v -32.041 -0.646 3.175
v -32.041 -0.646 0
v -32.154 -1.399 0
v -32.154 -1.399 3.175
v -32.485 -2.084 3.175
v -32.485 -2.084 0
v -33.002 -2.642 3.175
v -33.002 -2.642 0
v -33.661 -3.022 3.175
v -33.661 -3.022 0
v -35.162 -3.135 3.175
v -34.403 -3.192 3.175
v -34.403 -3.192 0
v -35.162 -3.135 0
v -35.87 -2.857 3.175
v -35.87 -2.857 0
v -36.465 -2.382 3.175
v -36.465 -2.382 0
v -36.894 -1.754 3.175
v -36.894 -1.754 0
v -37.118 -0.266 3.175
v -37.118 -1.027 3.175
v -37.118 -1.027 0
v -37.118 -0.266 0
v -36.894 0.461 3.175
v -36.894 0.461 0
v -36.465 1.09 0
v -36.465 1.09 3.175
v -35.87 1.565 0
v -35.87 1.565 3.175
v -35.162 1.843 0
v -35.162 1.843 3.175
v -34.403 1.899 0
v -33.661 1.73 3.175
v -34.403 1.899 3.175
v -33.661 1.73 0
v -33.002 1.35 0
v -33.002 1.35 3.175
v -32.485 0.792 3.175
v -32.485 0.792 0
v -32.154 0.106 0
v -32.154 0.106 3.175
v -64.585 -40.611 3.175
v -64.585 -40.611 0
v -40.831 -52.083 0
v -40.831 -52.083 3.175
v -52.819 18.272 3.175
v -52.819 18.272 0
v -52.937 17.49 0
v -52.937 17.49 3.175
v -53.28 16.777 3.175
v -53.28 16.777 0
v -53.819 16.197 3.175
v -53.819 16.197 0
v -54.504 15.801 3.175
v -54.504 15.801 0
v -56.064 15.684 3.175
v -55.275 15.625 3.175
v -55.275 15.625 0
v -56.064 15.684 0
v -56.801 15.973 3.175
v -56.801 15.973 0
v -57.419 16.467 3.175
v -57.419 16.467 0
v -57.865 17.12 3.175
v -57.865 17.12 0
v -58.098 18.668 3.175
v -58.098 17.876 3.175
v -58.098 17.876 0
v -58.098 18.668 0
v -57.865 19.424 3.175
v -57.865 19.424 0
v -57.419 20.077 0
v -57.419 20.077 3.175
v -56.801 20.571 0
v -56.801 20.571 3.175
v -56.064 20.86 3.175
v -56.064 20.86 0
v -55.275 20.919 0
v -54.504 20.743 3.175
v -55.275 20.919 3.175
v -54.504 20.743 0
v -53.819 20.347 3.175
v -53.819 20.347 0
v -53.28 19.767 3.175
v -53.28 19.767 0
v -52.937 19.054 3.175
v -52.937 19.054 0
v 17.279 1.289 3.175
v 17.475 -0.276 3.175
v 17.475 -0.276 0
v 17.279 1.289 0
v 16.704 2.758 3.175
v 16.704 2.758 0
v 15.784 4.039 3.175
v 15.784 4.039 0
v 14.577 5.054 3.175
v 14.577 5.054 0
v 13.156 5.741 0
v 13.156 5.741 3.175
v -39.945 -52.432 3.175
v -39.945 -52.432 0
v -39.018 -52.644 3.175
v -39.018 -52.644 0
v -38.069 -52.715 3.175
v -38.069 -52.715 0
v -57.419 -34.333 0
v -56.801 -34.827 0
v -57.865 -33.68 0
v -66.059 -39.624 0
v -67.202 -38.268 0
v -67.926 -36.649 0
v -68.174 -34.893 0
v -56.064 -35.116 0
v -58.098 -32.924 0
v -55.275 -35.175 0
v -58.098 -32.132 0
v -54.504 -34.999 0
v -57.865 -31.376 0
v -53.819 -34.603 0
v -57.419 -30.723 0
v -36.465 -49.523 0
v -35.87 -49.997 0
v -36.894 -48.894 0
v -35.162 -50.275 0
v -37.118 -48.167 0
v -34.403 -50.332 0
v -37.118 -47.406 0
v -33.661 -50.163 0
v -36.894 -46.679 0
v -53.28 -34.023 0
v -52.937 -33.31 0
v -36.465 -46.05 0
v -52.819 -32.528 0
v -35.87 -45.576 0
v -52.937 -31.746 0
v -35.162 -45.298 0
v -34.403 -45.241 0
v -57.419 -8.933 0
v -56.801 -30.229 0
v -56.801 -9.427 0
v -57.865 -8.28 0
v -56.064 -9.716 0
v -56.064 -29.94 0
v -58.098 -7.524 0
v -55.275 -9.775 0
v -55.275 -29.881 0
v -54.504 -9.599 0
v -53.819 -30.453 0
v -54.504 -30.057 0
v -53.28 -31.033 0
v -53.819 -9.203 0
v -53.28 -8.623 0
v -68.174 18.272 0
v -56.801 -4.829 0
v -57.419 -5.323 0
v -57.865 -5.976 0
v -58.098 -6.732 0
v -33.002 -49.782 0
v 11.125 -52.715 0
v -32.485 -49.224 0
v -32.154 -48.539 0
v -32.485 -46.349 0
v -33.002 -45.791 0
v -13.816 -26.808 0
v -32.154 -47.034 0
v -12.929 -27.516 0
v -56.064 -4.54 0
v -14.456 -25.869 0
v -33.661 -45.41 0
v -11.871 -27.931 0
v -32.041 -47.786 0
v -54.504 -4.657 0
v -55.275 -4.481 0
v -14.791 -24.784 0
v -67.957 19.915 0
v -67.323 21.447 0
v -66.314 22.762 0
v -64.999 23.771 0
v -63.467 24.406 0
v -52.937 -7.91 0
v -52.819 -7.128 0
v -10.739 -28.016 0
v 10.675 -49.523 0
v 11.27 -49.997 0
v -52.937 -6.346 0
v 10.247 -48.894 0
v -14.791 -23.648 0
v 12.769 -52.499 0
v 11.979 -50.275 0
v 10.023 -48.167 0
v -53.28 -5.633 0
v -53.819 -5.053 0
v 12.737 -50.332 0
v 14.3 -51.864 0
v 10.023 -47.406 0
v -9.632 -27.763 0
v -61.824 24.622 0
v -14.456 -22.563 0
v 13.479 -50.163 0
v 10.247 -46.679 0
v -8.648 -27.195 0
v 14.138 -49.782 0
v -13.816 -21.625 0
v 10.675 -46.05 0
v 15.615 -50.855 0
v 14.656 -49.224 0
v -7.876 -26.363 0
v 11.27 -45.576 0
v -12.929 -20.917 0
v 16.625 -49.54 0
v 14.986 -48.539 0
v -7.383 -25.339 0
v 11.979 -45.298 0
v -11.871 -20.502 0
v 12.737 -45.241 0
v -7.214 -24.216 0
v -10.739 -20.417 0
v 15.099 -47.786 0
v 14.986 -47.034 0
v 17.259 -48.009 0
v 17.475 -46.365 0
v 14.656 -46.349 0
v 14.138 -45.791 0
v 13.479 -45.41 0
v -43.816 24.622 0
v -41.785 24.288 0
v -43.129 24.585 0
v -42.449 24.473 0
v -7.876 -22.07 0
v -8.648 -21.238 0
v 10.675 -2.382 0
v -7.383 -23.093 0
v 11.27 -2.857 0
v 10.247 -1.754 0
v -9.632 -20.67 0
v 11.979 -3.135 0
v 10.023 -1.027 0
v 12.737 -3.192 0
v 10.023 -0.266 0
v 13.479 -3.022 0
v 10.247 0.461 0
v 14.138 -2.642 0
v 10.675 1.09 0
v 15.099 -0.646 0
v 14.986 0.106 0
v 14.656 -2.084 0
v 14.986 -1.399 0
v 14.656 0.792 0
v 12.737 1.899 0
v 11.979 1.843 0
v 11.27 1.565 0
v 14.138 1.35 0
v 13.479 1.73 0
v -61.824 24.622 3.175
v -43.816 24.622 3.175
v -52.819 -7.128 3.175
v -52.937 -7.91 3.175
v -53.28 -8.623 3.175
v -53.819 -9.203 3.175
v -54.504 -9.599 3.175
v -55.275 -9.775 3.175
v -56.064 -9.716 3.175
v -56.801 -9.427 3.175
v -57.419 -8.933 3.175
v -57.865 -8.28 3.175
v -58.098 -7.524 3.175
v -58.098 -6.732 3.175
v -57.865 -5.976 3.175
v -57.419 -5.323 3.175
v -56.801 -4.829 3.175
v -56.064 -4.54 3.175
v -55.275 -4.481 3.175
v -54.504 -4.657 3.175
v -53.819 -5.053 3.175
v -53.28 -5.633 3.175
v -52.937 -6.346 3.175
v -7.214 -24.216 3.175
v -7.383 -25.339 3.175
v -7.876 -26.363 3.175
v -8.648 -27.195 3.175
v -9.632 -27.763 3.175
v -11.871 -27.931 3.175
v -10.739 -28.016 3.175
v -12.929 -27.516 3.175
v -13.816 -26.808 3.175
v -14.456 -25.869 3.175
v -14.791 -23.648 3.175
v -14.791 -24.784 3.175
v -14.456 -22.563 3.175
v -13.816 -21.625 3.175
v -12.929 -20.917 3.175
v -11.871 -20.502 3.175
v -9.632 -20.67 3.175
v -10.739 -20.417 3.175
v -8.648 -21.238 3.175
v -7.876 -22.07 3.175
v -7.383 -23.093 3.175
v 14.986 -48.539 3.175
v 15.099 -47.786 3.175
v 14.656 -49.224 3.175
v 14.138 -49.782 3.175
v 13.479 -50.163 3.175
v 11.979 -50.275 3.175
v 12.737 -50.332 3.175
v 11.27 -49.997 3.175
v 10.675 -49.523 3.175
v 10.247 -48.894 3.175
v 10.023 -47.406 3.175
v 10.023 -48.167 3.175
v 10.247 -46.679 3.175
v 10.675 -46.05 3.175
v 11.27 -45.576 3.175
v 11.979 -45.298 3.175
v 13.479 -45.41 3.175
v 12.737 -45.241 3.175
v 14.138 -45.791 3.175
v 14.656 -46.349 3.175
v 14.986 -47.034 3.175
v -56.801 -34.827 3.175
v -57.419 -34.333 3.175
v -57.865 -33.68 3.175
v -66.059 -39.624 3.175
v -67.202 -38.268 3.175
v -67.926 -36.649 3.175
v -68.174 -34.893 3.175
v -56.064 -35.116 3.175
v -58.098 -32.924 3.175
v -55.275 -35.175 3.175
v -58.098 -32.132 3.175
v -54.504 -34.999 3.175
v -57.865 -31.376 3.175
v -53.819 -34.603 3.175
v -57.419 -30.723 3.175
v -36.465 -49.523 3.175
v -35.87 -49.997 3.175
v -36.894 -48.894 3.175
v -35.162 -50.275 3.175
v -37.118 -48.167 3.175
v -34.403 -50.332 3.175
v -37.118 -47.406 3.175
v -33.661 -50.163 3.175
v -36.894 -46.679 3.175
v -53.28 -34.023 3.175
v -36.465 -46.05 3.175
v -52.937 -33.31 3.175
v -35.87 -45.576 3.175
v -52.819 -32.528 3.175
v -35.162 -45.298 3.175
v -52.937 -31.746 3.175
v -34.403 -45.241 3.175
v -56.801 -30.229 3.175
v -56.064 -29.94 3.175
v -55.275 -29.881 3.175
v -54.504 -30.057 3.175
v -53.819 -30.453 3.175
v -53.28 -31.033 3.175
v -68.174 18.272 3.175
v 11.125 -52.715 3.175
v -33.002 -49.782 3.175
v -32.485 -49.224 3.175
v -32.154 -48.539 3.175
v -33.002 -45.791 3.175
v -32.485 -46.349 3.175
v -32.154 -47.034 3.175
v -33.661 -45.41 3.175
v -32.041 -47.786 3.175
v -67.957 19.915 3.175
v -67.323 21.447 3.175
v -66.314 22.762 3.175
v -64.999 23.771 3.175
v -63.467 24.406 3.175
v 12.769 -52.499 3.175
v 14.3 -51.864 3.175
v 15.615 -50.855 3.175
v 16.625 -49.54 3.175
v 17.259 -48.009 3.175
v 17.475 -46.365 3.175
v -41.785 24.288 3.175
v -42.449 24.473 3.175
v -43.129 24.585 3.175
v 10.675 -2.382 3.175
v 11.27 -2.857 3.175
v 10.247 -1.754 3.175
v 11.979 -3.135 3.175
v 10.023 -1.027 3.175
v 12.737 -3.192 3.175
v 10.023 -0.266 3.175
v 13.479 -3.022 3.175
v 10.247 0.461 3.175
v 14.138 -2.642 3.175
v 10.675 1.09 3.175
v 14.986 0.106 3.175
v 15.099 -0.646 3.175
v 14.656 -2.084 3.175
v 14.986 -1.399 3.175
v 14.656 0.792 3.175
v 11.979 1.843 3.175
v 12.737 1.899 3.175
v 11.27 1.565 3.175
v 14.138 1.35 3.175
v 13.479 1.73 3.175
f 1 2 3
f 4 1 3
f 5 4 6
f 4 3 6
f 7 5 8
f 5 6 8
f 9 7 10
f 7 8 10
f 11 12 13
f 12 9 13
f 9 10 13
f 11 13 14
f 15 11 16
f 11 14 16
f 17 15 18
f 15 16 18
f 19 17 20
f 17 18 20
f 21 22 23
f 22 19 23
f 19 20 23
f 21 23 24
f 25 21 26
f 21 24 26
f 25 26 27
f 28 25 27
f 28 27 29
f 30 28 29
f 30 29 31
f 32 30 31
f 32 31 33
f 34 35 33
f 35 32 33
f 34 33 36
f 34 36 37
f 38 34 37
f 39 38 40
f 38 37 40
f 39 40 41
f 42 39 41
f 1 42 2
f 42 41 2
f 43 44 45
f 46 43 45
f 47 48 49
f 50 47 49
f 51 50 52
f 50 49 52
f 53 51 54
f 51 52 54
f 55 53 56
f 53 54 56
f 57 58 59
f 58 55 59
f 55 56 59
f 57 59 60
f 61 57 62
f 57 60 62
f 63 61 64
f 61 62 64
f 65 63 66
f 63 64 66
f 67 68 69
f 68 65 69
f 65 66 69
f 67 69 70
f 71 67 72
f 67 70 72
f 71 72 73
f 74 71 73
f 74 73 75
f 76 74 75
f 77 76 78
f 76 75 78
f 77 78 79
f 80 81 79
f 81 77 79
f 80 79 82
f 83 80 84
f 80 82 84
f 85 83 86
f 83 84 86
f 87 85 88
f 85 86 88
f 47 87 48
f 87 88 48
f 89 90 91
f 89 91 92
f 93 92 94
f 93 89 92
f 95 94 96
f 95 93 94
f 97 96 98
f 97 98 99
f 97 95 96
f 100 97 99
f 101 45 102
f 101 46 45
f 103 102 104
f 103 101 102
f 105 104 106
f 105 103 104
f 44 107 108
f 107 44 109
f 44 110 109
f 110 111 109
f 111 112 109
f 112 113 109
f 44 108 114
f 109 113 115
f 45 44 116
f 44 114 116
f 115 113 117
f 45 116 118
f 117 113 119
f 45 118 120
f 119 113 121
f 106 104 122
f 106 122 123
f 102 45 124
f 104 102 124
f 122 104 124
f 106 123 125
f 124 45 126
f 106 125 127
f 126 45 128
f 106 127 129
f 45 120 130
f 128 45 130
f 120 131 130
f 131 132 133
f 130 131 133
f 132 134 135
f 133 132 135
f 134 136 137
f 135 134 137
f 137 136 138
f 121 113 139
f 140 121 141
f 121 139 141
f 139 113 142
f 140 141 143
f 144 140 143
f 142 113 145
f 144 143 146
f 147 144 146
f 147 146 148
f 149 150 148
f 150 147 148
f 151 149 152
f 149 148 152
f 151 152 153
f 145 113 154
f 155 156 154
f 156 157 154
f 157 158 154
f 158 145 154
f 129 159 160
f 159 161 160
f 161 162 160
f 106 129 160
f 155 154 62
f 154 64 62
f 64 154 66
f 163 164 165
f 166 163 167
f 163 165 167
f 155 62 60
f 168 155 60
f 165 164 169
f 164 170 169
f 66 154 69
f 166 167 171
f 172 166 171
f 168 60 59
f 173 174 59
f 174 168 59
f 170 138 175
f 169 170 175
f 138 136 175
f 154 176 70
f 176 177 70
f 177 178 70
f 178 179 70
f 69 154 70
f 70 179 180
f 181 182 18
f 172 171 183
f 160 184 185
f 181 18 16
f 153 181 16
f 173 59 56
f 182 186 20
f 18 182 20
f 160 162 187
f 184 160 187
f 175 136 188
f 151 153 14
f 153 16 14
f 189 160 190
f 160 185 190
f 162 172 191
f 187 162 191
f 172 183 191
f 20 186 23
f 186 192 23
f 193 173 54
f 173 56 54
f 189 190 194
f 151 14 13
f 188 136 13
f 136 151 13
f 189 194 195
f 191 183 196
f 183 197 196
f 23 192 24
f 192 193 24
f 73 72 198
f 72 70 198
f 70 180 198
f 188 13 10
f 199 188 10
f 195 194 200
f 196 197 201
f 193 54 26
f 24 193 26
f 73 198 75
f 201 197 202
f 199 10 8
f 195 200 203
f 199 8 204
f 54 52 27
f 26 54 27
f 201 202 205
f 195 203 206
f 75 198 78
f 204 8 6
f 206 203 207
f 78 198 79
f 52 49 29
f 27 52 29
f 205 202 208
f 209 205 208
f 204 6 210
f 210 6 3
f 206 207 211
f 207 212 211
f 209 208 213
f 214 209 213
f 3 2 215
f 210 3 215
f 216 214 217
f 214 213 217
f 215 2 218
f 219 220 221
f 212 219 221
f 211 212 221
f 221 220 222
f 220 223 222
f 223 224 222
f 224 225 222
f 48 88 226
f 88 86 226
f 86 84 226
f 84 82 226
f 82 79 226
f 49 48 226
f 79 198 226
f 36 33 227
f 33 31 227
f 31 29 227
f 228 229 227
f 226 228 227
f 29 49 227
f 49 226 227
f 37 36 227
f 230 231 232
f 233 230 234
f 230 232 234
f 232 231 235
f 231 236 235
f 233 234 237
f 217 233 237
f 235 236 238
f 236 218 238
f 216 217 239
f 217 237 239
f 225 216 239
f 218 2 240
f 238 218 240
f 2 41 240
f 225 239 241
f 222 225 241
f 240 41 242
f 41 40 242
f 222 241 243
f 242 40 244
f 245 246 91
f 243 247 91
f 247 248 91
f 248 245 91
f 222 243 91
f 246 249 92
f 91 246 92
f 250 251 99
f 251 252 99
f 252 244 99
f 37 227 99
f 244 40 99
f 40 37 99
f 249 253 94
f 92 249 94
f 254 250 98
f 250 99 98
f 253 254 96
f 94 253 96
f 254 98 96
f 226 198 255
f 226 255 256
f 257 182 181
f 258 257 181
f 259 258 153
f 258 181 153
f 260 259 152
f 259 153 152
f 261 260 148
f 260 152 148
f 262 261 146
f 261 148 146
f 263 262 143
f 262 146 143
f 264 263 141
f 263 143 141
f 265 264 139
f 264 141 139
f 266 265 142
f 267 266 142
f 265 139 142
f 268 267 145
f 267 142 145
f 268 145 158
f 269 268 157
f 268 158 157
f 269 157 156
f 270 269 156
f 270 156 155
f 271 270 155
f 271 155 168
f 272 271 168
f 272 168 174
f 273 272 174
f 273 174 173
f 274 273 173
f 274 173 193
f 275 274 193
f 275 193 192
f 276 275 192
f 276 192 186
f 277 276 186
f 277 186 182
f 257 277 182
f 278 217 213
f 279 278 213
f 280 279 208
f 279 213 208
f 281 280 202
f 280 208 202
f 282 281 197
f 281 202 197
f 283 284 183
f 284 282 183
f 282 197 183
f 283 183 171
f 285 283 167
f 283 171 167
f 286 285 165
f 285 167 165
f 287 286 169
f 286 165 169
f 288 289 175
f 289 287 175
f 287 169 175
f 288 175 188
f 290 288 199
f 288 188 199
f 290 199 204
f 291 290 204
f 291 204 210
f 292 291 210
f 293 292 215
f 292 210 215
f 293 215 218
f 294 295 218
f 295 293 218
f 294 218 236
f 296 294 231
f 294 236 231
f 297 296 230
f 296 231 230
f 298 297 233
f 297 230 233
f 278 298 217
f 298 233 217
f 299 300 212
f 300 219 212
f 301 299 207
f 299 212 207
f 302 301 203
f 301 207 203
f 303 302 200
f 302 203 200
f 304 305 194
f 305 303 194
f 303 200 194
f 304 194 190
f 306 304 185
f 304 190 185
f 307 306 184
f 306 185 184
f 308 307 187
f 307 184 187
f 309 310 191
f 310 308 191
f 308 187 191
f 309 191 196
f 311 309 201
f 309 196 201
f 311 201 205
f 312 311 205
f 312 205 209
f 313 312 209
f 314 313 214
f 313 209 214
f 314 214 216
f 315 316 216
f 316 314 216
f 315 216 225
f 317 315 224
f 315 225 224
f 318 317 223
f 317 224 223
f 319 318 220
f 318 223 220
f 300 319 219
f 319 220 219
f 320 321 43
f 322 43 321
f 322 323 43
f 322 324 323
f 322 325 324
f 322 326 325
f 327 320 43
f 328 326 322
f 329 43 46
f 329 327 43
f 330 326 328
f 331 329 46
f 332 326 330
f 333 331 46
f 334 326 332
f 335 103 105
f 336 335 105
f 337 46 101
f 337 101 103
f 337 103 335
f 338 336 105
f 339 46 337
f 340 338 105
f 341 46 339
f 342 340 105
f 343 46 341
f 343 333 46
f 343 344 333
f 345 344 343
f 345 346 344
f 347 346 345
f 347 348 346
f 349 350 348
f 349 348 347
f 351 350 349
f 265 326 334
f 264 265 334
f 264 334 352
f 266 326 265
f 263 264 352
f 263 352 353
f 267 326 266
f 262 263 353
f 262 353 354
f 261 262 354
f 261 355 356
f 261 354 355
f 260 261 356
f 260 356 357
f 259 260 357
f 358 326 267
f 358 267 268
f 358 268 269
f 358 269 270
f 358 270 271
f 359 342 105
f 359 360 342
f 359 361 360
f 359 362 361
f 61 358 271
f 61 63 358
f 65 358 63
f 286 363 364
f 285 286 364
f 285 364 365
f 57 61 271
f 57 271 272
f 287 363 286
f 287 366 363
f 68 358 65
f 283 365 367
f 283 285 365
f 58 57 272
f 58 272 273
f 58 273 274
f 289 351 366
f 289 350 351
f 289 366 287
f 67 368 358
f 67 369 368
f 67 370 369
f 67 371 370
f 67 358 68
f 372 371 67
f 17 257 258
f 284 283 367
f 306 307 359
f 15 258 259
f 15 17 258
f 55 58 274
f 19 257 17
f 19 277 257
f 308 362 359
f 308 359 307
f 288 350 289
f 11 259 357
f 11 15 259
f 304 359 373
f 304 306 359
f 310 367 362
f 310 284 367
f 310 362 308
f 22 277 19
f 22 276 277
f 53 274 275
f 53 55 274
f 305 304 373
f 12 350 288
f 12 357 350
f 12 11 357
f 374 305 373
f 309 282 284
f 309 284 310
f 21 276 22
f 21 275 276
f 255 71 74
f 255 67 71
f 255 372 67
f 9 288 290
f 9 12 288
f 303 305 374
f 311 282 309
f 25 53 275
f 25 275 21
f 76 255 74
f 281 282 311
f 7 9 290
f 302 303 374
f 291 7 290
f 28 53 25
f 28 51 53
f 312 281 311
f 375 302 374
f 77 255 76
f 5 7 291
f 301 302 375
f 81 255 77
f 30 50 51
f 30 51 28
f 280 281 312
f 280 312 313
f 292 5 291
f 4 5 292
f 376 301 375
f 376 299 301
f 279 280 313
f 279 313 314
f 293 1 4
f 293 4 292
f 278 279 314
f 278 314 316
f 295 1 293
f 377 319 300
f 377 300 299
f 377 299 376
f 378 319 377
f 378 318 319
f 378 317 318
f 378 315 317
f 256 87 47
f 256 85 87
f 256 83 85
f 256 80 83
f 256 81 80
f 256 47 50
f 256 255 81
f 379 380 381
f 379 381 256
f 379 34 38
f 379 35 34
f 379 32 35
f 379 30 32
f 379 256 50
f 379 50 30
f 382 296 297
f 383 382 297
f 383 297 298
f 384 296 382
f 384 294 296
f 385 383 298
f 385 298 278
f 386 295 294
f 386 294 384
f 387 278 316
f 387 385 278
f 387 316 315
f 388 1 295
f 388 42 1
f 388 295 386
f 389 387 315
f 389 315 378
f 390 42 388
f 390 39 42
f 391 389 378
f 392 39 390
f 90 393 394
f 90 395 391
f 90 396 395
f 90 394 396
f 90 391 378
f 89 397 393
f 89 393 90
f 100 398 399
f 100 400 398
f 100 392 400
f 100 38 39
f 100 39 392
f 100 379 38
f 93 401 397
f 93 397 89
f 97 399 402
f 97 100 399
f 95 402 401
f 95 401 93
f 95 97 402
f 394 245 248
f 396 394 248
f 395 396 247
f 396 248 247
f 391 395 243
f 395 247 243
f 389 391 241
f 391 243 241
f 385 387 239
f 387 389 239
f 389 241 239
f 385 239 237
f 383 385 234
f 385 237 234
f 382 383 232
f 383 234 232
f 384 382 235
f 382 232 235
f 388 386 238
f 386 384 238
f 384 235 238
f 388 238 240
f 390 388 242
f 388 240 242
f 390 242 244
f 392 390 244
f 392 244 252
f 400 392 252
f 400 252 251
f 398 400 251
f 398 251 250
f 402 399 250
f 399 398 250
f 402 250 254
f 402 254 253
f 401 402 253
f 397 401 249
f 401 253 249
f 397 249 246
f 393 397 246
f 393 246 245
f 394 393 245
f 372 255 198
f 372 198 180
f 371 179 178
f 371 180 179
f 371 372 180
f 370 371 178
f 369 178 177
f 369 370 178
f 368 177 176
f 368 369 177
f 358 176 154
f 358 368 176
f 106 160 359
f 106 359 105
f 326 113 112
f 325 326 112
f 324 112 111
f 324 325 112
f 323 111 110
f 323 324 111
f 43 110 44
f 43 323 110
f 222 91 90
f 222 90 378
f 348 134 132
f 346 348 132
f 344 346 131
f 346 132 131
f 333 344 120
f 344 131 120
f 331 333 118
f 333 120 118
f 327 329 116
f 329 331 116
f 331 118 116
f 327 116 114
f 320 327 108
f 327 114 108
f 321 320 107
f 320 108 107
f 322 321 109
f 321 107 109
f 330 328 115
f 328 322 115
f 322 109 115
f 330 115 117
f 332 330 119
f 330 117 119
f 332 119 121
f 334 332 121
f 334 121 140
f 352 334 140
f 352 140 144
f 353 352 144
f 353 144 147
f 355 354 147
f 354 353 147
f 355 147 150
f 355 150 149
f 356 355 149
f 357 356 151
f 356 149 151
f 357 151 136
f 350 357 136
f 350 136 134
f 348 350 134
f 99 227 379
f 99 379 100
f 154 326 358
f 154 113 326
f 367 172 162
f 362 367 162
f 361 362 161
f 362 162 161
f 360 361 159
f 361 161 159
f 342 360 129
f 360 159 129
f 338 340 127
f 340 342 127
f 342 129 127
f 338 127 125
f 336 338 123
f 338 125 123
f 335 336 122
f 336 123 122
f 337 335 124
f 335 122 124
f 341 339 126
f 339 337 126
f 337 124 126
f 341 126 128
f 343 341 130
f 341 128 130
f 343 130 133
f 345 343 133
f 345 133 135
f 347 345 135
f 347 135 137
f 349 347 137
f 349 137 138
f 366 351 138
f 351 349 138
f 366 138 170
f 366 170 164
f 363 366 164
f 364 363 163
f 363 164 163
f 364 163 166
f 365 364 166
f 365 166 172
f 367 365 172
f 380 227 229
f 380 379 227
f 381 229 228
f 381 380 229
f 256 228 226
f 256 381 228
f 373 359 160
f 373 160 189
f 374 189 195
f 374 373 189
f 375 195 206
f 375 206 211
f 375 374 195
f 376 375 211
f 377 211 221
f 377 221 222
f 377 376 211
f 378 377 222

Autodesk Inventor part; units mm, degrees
ref_plane "YZ Plane" through (0, 0, 0) normal (1, 0, 0) x (0, 1, 0)
ref_plane "XZ Plane" through (0, 0, 0) normal (0, 1, 0) x (-1, 0, 0)
ref_plane "XY Plane" through (0, 0, 0) normal (0, 0, 1) x (1, 0, 0)
sketch "Sketch1" plane through (0, 0, 0) normal (0, 0, 1) x (1, 0, 0)
  line L0 (-39.5223, 4.2825) -> (17.4753, 4.2825)
  line L1 (17.4753, 4.2825) -> (17.4753, -52.7151)
  line L2 (17.4753, -52.7151) -> (-39.5223, -52.7151)
  line L3 (-39.5223, -52.7151) -> (-39.5223, 4.2825)
  circle A0 centre (-34.5937, -47.7865) radius 2.5527
  circle A1 centre (12.5467, -47.7865) radius 2.5527
  circle A2 centre (-34.5937, -0.6461) radius 2.5527
  circle A3 centre (12.5467, -0.6461) radius 2.5527
  line L4 (-68.1735, 24.6219) -> (-42.7735, 24.6219)
  line L5 (-42.7735, 24.6219) -> (-42.7735, -38.8781)
  line L6 (-42.7735, -38.8781) -> (-68.1735, -38.8781)
  line L7 (-68.1735, -38.8781) -> (-68.1735, 24.6219)
  circle A4 centre (-55.4735, 18.2719) radius 2.6543
  circle A5 centre (-55.4735, -32.5281) radius 2.6543
  circle A6 centre (-55.4735, -7.1281) radius 2.6543
  line L8 (-68.1735, -7.1281) -> (-42.7735, -7.1281)
  circle A7 centre (-55.4735, 46.8469) radius 8.6868
  line L9 (-42.7735, 24.6219) -> (17.4753, 4.2825)
  line L10 (-68.1735, -38.8781) -> (-39.5223, -52.7151)
  circle A8 centre (-11.0235, -24.2163) radius 3.81
  point P0 (0, 0)
  dimension "d0" = 56.9976
  dimension "d1" = 56.9976
  dimension "d3" = 5.1054
  dimension "d4" = 5.1054
  dimension "d5" = 5.1054
  dimension "d7" = 5.1054
  dimension "d15" = 28.4988
  dimension "d16" = 28.4988
  dimension "d17" = 63.5
  dimension "d18" = 25.4
  dimension "d19" = 25.4
  dimension "d20" = 0
  dimension "d21" = 5.3086
  dimension "d22" = 5.3086
  dimension "d23" = 5.3086
  dimension "d24" = 28.575
  dimension "d26" = 12.7
  dimension "d28" = 0
  dimension "d29" = 0
  dimension "d30" = 12.7
  dimension "d33" = 83.82
  dimension "d34" = 44.45
  dimension "d37" = 7.62
  dimension "d39" = 66.6666
  dimension "d40" = 66.6666
  dimension "d41" = 33.3333
  dimension "d42" = 33.3333
extrude "Extrusion1" add sketch "Sketch1" along normal blind 3.175 contours L3 L10 L6 L5 L9 L0 | L0 L1 L2 L3 | L5 L8 A6 L7 L4 | L7 L8 A6 L5 L6
fillet "Fillet1" radius 6.35 6 edges at (-42.7735, 24.6219, 1.5875) (-68.1735, 24.6219, 1.5875) (17.4753, 4.2825, 1.5875) (17.4753, -52.7151, 1.5875) (-39.5223, -52.7151, 1.5875) (-68.1735, -38.8781, 1.5875)
equation "\"d4\" = d3"
equation "\"d15\" = 0.5 * d0"
equation "\"d16\" = d15"
equation "\"d19\" = d18"
equation "\"d22\" = d21"
equation "\"d23\" = d21"
equation "\"d40\" = d39"
equation "\"d41\" = 0.5 * d39"
equation "\"d42\" = d41"
properties part number "Diff Motor Bracket"
